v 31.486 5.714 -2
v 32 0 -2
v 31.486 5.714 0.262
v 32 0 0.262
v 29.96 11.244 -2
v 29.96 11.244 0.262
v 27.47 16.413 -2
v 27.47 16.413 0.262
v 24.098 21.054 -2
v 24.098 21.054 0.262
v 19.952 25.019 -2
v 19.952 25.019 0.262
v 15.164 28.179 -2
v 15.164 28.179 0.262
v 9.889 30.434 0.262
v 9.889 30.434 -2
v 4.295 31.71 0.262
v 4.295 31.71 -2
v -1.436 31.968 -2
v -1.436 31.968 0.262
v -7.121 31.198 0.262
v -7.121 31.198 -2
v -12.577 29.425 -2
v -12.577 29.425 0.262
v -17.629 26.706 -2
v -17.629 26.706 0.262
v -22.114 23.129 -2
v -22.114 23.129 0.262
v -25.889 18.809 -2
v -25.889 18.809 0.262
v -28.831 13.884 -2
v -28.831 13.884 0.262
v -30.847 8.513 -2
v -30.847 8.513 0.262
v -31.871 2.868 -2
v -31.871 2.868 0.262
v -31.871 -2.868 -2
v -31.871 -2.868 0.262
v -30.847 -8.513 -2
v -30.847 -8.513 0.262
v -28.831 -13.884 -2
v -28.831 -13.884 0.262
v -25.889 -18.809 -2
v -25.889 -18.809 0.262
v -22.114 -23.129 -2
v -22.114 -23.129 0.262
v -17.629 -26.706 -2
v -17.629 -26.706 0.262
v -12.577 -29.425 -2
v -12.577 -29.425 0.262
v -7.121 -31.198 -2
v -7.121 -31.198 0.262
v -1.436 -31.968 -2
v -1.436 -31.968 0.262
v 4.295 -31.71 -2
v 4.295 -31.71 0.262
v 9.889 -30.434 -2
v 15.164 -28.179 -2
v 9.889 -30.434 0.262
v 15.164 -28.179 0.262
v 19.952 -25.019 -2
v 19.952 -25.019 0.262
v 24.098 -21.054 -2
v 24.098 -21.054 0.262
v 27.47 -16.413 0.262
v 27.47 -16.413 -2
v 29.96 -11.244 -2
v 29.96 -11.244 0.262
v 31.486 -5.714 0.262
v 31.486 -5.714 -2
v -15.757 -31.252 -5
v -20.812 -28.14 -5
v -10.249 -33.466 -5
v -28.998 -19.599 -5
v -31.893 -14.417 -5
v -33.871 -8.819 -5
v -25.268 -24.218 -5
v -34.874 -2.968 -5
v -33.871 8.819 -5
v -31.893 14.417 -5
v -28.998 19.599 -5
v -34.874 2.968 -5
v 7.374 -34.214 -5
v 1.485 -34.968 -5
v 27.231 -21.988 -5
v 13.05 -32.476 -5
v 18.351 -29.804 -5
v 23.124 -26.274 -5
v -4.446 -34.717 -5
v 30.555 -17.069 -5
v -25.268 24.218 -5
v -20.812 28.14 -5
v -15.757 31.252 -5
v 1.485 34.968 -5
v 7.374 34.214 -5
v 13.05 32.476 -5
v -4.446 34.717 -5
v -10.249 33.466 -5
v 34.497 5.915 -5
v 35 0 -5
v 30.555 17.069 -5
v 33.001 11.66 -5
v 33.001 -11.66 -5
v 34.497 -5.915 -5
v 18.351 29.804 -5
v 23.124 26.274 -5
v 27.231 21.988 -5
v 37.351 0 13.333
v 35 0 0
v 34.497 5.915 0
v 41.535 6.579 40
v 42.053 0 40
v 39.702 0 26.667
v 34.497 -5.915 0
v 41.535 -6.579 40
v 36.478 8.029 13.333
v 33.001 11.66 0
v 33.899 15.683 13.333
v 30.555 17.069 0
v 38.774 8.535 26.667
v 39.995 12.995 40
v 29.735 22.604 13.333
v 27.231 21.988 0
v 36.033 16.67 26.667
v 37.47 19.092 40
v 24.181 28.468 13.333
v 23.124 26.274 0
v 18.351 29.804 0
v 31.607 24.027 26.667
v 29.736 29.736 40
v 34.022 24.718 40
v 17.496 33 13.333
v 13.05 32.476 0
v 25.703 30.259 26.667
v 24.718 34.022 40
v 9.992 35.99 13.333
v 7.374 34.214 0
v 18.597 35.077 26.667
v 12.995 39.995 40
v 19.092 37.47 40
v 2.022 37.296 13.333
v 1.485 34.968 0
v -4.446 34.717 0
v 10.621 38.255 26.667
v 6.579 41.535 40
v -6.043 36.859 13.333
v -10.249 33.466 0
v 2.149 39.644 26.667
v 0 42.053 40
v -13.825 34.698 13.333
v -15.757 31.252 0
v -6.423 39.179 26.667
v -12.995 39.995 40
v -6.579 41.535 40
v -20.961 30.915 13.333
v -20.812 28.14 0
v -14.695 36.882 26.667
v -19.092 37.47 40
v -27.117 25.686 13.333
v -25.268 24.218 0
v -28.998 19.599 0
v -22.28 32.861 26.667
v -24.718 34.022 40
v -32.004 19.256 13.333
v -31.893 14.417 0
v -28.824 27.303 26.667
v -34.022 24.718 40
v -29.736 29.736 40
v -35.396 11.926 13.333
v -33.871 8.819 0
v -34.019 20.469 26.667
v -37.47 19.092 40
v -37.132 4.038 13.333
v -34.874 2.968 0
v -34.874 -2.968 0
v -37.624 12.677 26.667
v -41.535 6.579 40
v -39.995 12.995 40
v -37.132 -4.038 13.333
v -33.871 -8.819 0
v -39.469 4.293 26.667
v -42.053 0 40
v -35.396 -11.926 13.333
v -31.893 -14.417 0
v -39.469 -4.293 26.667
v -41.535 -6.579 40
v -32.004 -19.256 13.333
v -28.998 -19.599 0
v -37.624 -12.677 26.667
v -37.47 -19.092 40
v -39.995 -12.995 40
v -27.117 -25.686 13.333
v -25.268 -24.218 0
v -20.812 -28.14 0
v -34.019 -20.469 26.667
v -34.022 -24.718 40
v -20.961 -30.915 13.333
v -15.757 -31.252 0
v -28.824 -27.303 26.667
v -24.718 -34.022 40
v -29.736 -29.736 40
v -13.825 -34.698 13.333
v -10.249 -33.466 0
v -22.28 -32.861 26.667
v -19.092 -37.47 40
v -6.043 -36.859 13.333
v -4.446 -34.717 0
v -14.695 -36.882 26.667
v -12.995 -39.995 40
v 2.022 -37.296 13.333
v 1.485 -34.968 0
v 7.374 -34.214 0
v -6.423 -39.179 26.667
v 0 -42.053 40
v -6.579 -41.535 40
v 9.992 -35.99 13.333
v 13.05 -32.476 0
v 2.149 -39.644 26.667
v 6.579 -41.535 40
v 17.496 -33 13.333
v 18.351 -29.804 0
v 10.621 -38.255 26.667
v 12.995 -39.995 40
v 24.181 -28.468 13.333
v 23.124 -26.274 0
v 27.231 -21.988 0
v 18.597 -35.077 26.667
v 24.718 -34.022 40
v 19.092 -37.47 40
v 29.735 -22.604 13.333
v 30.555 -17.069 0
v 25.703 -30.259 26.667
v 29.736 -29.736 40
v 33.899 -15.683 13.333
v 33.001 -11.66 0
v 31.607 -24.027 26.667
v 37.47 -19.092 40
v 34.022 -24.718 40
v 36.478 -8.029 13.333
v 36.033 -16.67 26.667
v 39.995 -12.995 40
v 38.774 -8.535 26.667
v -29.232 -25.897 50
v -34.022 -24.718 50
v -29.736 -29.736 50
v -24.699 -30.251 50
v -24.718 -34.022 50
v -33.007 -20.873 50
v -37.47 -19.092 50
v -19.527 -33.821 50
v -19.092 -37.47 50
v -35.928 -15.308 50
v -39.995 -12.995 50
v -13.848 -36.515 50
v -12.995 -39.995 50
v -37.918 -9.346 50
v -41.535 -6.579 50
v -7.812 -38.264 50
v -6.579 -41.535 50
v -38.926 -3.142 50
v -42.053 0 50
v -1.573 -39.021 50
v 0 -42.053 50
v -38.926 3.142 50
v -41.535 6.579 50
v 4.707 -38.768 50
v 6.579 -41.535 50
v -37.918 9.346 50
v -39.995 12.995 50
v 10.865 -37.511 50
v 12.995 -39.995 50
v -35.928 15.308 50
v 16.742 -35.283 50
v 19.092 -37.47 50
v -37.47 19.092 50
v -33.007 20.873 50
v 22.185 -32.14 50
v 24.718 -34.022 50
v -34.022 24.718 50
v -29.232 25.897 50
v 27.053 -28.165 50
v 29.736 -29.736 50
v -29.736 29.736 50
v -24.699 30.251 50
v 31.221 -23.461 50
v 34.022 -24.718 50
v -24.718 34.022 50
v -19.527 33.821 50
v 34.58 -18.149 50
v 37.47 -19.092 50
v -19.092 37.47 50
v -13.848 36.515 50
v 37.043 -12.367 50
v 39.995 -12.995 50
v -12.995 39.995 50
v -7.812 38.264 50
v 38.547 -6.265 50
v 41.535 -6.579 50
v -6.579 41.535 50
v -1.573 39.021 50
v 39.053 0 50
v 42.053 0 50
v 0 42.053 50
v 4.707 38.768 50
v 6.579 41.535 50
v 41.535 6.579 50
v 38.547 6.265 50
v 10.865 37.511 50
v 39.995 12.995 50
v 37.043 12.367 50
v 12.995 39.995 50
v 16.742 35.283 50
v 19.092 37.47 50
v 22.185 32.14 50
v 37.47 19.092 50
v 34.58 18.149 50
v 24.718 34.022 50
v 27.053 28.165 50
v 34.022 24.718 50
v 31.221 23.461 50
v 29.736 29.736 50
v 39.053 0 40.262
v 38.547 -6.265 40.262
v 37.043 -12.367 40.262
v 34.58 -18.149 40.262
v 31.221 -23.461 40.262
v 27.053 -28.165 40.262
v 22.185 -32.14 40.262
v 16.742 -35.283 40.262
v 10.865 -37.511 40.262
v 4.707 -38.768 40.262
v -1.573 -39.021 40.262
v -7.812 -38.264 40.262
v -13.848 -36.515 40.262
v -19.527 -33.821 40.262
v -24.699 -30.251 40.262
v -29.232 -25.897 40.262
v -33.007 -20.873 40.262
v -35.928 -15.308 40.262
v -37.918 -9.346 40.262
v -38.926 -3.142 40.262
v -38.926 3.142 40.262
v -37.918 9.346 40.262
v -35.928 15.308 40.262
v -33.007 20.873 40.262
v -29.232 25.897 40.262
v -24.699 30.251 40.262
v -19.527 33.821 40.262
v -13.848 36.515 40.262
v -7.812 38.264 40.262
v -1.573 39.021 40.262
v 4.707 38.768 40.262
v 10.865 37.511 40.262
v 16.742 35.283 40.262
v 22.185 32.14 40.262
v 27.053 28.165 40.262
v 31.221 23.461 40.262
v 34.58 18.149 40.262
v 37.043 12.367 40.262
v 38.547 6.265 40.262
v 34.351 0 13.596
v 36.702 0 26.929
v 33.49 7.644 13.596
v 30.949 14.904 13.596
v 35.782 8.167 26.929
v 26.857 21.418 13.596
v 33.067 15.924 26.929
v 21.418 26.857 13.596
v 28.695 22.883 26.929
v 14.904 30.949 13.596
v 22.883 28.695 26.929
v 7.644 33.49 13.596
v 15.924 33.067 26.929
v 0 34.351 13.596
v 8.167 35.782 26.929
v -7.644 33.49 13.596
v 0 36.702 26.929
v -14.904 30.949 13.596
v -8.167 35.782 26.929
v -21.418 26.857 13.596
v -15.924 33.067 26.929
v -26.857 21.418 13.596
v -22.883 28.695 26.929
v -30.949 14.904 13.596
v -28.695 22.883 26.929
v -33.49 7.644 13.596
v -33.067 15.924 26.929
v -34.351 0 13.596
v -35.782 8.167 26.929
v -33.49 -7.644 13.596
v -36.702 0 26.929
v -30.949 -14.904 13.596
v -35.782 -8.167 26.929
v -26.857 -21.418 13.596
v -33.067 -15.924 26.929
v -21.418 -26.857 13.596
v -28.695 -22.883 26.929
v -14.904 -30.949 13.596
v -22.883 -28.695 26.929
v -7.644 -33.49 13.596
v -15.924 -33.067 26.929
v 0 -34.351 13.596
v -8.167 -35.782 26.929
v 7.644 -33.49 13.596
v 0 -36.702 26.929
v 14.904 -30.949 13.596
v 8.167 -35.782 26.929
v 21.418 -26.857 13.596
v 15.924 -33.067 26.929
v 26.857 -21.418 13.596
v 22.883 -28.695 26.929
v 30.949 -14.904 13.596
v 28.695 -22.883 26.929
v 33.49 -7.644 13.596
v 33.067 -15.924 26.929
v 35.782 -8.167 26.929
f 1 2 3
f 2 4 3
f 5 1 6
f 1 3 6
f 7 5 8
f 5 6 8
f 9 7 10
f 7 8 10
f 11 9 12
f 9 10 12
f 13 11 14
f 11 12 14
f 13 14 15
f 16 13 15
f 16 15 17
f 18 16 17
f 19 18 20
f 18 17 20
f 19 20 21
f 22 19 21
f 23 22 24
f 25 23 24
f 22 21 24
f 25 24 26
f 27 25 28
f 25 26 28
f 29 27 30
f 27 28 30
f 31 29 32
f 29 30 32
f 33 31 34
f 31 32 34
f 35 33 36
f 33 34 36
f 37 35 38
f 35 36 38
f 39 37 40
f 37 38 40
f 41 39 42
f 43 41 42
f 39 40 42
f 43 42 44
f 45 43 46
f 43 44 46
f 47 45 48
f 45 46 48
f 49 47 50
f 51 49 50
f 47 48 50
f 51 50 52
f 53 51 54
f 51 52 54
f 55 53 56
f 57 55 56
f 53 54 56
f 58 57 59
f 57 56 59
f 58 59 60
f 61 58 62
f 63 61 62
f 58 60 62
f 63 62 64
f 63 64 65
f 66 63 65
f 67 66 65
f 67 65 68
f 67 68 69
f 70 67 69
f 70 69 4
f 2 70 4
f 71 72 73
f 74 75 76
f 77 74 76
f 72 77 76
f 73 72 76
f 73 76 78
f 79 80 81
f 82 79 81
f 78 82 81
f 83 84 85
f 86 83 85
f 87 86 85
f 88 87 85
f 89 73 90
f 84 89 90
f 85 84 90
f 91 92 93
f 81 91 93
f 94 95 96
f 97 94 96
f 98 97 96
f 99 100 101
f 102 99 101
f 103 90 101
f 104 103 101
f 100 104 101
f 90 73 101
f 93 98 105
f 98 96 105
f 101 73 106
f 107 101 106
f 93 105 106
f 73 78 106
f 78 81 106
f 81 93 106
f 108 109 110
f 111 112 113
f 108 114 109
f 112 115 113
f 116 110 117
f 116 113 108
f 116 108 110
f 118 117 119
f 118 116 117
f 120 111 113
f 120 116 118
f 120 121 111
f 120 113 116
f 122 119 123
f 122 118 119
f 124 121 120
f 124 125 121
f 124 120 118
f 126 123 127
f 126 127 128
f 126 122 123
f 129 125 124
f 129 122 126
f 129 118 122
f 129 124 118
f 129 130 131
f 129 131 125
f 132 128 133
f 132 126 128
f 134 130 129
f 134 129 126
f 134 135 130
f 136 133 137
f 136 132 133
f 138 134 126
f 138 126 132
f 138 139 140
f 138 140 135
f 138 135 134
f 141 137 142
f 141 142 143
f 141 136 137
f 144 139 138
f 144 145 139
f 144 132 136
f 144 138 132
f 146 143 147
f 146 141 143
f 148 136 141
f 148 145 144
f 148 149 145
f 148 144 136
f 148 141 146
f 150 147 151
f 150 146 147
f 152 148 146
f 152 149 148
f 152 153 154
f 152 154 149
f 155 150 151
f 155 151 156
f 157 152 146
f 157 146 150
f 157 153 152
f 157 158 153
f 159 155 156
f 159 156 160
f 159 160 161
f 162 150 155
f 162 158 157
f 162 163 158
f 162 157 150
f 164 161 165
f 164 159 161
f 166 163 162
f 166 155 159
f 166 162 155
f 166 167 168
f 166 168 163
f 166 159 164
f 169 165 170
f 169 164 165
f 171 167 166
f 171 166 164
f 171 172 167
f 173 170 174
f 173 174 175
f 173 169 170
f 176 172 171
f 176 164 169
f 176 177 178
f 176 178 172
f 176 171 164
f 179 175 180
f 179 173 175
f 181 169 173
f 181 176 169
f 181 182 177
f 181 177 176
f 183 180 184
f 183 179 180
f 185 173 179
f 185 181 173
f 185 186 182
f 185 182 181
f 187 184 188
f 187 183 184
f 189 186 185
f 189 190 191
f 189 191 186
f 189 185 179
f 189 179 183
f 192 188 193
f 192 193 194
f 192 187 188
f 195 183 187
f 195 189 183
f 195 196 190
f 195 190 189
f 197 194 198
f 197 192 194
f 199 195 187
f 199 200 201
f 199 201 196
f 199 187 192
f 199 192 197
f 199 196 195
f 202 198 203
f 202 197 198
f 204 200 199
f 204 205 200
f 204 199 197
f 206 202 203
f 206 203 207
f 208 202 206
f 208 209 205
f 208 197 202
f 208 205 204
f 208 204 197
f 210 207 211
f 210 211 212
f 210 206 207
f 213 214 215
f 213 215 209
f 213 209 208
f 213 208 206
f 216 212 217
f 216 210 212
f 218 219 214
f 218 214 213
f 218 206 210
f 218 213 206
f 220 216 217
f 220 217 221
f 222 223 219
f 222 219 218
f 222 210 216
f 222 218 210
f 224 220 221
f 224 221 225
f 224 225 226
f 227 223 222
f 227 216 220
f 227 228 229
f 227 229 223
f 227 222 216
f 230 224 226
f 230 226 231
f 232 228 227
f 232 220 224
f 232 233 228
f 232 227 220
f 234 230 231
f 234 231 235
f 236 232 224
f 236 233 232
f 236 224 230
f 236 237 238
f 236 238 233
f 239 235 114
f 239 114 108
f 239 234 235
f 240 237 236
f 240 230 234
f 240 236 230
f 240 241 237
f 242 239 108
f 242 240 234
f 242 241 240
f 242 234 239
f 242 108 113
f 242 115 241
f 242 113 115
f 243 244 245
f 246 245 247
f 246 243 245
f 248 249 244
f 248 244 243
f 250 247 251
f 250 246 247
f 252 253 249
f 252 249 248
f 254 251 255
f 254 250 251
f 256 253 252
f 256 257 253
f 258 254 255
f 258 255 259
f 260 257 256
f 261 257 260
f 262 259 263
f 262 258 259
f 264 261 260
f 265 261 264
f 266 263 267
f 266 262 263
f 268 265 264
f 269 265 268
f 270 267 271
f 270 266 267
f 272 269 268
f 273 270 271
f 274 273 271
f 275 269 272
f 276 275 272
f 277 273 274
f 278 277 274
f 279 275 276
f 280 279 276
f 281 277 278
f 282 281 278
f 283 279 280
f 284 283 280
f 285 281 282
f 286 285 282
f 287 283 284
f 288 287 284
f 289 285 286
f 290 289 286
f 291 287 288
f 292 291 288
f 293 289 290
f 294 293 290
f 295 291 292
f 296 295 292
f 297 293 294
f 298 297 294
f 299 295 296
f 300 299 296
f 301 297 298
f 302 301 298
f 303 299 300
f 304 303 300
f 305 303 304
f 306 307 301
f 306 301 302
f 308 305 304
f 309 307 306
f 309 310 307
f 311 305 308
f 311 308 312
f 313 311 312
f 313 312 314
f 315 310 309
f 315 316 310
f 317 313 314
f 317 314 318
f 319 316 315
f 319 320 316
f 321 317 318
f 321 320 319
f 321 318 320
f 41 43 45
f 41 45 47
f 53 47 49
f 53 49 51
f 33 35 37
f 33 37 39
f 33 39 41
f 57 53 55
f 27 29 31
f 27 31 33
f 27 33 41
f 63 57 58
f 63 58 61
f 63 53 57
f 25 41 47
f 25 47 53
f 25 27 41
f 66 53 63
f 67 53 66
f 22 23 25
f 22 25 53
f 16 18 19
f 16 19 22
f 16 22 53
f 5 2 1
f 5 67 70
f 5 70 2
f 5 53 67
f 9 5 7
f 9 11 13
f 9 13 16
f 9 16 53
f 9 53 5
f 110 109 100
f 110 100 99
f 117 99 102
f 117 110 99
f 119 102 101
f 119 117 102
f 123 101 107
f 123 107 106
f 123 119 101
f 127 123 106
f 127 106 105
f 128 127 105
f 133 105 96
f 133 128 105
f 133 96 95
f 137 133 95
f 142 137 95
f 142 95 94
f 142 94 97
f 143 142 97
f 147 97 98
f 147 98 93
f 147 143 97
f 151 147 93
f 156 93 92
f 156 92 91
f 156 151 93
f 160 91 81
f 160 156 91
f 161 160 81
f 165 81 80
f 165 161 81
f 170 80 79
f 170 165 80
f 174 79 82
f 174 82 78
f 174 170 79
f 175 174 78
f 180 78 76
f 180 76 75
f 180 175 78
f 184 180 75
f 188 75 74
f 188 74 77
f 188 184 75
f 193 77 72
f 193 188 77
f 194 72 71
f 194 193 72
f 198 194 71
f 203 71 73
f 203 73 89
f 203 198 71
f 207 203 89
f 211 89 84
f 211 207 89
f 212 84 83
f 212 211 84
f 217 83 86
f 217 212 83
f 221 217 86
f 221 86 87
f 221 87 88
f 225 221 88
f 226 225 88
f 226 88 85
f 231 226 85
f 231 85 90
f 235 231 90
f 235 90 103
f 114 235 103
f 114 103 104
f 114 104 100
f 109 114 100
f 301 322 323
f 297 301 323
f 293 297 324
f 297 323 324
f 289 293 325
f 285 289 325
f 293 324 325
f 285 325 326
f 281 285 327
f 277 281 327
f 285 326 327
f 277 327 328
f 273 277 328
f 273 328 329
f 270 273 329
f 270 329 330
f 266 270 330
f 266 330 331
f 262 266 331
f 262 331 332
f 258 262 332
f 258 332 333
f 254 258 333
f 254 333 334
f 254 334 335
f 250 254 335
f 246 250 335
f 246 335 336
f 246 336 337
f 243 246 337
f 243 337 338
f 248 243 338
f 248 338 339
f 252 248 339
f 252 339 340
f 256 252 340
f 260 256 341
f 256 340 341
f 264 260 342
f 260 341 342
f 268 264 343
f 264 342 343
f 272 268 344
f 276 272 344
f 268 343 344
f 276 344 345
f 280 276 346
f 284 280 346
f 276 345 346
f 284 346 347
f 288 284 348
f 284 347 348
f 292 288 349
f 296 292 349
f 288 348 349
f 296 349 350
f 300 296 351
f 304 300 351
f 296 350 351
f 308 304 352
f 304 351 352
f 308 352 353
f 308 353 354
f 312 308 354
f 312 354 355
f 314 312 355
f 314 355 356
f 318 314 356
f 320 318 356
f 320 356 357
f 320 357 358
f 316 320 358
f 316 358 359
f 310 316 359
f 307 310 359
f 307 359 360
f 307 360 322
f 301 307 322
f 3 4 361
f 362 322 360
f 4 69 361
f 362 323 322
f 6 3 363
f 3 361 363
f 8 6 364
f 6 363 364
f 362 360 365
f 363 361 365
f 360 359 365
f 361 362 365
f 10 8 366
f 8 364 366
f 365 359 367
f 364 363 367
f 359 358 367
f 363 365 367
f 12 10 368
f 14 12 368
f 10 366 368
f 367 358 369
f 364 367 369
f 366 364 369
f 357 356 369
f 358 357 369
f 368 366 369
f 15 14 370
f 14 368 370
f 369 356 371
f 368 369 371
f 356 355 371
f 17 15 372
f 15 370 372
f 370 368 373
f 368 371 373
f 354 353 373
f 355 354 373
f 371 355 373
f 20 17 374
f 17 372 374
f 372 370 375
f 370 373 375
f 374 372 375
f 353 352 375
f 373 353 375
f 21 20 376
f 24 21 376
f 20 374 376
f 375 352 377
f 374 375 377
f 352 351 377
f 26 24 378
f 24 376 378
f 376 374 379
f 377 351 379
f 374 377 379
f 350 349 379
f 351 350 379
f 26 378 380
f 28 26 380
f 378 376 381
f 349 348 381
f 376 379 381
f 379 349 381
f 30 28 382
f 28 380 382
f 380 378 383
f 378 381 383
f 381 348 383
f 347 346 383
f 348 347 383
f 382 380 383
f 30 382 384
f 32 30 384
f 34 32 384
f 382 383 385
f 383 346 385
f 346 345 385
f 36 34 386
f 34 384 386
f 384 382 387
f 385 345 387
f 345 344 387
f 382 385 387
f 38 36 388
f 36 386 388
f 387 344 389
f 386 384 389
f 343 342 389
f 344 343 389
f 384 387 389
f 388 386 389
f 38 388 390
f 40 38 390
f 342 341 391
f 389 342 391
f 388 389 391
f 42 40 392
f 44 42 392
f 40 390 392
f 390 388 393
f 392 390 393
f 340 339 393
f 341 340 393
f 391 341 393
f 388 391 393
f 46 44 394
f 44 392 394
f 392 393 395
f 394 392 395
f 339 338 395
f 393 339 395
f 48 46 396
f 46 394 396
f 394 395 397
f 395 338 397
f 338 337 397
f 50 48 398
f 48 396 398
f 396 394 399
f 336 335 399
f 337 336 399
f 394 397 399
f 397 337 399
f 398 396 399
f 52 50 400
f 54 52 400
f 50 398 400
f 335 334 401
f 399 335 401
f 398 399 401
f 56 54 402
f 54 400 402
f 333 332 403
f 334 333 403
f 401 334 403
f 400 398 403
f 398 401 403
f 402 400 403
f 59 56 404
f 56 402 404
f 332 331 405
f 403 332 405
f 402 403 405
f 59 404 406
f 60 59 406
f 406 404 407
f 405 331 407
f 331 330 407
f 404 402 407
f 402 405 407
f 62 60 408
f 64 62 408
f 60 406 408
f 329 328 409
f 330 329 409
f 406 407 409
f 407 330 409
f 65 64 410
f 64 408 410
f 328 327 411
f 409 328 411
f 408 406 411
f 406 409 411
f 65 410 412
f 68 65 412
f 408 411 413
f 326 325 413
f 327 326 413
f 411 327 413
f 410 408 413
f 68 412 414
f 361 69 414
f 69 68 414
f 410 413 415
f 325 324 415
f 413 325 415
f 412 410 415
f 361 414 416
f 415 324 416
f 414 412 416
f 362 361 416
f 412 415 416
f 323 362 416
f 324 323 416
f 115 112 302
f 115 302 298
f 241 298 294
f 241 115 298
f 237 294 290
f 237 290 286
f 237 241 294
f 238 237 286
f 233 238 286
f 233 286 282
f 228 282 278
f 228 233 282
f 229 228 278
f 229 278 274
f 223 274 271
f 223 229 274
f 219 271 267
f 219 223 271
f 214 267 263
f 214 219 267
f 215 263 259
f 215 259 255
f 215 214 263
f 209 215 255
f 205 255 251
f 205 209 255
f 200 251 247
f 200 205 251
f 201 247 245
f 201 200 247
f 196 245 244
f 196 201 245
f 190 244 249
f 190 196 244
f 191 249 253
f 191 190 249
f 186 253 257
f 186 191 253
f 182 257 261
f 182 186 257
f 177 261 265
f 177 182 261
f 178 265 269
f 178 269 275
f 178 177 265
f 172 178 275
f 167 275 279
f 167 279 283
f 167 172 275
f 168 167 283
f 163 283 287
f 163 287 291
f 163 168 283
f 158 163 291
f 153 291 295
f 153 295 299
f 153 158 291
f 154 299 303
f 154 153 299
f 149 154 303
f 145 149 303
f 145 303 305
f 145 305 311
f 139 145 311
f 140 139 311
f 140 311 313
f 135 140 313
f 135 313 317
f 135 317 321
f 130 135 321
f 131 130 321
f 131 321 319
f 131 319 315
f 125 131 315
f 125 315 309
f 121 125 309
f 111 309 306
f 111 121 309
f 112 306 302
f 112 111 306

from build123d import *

# Parameters (mm, degrees)
F0_R      = 35
F1_DEPTH  = 5
F1_FACE_R = 35
F2_DEPTH  = 40
F2_TAPER  = -10
F3_DEPTH  = 10
F4_T      = -3


with BuildPart() as f1:
    # F0 (on Top) → F1 (new body)
    with BuildSketch(Plane.XY):
        Circle(F0_R)
    extrude(amount=-F1_DEPTH)

    # F1_face (on face) → F2 (join)
    with BuildSketch(Plane.XY):
        Circle(F1_FACE_R)
    extrude(amount=F2_DEPTH, taper=F2_TAPER)

    # F3 (add): a face of the model
    f3_faces = [f1.faces().sort_by_distance(p)[0] for p in [
        (0, 0, 40),
    ]]
    extrude(f3_faces, amount=F3_DEPTH)

    # F4
    f4_openings = [f1.faces().sort_by_distance(p)[0] for p in [
        (0, 0, 50),
    ]]
    offset(amount=F4_T, openings=f4_openings, kind=Kind.INTERSECTION)


solid = f1.part
